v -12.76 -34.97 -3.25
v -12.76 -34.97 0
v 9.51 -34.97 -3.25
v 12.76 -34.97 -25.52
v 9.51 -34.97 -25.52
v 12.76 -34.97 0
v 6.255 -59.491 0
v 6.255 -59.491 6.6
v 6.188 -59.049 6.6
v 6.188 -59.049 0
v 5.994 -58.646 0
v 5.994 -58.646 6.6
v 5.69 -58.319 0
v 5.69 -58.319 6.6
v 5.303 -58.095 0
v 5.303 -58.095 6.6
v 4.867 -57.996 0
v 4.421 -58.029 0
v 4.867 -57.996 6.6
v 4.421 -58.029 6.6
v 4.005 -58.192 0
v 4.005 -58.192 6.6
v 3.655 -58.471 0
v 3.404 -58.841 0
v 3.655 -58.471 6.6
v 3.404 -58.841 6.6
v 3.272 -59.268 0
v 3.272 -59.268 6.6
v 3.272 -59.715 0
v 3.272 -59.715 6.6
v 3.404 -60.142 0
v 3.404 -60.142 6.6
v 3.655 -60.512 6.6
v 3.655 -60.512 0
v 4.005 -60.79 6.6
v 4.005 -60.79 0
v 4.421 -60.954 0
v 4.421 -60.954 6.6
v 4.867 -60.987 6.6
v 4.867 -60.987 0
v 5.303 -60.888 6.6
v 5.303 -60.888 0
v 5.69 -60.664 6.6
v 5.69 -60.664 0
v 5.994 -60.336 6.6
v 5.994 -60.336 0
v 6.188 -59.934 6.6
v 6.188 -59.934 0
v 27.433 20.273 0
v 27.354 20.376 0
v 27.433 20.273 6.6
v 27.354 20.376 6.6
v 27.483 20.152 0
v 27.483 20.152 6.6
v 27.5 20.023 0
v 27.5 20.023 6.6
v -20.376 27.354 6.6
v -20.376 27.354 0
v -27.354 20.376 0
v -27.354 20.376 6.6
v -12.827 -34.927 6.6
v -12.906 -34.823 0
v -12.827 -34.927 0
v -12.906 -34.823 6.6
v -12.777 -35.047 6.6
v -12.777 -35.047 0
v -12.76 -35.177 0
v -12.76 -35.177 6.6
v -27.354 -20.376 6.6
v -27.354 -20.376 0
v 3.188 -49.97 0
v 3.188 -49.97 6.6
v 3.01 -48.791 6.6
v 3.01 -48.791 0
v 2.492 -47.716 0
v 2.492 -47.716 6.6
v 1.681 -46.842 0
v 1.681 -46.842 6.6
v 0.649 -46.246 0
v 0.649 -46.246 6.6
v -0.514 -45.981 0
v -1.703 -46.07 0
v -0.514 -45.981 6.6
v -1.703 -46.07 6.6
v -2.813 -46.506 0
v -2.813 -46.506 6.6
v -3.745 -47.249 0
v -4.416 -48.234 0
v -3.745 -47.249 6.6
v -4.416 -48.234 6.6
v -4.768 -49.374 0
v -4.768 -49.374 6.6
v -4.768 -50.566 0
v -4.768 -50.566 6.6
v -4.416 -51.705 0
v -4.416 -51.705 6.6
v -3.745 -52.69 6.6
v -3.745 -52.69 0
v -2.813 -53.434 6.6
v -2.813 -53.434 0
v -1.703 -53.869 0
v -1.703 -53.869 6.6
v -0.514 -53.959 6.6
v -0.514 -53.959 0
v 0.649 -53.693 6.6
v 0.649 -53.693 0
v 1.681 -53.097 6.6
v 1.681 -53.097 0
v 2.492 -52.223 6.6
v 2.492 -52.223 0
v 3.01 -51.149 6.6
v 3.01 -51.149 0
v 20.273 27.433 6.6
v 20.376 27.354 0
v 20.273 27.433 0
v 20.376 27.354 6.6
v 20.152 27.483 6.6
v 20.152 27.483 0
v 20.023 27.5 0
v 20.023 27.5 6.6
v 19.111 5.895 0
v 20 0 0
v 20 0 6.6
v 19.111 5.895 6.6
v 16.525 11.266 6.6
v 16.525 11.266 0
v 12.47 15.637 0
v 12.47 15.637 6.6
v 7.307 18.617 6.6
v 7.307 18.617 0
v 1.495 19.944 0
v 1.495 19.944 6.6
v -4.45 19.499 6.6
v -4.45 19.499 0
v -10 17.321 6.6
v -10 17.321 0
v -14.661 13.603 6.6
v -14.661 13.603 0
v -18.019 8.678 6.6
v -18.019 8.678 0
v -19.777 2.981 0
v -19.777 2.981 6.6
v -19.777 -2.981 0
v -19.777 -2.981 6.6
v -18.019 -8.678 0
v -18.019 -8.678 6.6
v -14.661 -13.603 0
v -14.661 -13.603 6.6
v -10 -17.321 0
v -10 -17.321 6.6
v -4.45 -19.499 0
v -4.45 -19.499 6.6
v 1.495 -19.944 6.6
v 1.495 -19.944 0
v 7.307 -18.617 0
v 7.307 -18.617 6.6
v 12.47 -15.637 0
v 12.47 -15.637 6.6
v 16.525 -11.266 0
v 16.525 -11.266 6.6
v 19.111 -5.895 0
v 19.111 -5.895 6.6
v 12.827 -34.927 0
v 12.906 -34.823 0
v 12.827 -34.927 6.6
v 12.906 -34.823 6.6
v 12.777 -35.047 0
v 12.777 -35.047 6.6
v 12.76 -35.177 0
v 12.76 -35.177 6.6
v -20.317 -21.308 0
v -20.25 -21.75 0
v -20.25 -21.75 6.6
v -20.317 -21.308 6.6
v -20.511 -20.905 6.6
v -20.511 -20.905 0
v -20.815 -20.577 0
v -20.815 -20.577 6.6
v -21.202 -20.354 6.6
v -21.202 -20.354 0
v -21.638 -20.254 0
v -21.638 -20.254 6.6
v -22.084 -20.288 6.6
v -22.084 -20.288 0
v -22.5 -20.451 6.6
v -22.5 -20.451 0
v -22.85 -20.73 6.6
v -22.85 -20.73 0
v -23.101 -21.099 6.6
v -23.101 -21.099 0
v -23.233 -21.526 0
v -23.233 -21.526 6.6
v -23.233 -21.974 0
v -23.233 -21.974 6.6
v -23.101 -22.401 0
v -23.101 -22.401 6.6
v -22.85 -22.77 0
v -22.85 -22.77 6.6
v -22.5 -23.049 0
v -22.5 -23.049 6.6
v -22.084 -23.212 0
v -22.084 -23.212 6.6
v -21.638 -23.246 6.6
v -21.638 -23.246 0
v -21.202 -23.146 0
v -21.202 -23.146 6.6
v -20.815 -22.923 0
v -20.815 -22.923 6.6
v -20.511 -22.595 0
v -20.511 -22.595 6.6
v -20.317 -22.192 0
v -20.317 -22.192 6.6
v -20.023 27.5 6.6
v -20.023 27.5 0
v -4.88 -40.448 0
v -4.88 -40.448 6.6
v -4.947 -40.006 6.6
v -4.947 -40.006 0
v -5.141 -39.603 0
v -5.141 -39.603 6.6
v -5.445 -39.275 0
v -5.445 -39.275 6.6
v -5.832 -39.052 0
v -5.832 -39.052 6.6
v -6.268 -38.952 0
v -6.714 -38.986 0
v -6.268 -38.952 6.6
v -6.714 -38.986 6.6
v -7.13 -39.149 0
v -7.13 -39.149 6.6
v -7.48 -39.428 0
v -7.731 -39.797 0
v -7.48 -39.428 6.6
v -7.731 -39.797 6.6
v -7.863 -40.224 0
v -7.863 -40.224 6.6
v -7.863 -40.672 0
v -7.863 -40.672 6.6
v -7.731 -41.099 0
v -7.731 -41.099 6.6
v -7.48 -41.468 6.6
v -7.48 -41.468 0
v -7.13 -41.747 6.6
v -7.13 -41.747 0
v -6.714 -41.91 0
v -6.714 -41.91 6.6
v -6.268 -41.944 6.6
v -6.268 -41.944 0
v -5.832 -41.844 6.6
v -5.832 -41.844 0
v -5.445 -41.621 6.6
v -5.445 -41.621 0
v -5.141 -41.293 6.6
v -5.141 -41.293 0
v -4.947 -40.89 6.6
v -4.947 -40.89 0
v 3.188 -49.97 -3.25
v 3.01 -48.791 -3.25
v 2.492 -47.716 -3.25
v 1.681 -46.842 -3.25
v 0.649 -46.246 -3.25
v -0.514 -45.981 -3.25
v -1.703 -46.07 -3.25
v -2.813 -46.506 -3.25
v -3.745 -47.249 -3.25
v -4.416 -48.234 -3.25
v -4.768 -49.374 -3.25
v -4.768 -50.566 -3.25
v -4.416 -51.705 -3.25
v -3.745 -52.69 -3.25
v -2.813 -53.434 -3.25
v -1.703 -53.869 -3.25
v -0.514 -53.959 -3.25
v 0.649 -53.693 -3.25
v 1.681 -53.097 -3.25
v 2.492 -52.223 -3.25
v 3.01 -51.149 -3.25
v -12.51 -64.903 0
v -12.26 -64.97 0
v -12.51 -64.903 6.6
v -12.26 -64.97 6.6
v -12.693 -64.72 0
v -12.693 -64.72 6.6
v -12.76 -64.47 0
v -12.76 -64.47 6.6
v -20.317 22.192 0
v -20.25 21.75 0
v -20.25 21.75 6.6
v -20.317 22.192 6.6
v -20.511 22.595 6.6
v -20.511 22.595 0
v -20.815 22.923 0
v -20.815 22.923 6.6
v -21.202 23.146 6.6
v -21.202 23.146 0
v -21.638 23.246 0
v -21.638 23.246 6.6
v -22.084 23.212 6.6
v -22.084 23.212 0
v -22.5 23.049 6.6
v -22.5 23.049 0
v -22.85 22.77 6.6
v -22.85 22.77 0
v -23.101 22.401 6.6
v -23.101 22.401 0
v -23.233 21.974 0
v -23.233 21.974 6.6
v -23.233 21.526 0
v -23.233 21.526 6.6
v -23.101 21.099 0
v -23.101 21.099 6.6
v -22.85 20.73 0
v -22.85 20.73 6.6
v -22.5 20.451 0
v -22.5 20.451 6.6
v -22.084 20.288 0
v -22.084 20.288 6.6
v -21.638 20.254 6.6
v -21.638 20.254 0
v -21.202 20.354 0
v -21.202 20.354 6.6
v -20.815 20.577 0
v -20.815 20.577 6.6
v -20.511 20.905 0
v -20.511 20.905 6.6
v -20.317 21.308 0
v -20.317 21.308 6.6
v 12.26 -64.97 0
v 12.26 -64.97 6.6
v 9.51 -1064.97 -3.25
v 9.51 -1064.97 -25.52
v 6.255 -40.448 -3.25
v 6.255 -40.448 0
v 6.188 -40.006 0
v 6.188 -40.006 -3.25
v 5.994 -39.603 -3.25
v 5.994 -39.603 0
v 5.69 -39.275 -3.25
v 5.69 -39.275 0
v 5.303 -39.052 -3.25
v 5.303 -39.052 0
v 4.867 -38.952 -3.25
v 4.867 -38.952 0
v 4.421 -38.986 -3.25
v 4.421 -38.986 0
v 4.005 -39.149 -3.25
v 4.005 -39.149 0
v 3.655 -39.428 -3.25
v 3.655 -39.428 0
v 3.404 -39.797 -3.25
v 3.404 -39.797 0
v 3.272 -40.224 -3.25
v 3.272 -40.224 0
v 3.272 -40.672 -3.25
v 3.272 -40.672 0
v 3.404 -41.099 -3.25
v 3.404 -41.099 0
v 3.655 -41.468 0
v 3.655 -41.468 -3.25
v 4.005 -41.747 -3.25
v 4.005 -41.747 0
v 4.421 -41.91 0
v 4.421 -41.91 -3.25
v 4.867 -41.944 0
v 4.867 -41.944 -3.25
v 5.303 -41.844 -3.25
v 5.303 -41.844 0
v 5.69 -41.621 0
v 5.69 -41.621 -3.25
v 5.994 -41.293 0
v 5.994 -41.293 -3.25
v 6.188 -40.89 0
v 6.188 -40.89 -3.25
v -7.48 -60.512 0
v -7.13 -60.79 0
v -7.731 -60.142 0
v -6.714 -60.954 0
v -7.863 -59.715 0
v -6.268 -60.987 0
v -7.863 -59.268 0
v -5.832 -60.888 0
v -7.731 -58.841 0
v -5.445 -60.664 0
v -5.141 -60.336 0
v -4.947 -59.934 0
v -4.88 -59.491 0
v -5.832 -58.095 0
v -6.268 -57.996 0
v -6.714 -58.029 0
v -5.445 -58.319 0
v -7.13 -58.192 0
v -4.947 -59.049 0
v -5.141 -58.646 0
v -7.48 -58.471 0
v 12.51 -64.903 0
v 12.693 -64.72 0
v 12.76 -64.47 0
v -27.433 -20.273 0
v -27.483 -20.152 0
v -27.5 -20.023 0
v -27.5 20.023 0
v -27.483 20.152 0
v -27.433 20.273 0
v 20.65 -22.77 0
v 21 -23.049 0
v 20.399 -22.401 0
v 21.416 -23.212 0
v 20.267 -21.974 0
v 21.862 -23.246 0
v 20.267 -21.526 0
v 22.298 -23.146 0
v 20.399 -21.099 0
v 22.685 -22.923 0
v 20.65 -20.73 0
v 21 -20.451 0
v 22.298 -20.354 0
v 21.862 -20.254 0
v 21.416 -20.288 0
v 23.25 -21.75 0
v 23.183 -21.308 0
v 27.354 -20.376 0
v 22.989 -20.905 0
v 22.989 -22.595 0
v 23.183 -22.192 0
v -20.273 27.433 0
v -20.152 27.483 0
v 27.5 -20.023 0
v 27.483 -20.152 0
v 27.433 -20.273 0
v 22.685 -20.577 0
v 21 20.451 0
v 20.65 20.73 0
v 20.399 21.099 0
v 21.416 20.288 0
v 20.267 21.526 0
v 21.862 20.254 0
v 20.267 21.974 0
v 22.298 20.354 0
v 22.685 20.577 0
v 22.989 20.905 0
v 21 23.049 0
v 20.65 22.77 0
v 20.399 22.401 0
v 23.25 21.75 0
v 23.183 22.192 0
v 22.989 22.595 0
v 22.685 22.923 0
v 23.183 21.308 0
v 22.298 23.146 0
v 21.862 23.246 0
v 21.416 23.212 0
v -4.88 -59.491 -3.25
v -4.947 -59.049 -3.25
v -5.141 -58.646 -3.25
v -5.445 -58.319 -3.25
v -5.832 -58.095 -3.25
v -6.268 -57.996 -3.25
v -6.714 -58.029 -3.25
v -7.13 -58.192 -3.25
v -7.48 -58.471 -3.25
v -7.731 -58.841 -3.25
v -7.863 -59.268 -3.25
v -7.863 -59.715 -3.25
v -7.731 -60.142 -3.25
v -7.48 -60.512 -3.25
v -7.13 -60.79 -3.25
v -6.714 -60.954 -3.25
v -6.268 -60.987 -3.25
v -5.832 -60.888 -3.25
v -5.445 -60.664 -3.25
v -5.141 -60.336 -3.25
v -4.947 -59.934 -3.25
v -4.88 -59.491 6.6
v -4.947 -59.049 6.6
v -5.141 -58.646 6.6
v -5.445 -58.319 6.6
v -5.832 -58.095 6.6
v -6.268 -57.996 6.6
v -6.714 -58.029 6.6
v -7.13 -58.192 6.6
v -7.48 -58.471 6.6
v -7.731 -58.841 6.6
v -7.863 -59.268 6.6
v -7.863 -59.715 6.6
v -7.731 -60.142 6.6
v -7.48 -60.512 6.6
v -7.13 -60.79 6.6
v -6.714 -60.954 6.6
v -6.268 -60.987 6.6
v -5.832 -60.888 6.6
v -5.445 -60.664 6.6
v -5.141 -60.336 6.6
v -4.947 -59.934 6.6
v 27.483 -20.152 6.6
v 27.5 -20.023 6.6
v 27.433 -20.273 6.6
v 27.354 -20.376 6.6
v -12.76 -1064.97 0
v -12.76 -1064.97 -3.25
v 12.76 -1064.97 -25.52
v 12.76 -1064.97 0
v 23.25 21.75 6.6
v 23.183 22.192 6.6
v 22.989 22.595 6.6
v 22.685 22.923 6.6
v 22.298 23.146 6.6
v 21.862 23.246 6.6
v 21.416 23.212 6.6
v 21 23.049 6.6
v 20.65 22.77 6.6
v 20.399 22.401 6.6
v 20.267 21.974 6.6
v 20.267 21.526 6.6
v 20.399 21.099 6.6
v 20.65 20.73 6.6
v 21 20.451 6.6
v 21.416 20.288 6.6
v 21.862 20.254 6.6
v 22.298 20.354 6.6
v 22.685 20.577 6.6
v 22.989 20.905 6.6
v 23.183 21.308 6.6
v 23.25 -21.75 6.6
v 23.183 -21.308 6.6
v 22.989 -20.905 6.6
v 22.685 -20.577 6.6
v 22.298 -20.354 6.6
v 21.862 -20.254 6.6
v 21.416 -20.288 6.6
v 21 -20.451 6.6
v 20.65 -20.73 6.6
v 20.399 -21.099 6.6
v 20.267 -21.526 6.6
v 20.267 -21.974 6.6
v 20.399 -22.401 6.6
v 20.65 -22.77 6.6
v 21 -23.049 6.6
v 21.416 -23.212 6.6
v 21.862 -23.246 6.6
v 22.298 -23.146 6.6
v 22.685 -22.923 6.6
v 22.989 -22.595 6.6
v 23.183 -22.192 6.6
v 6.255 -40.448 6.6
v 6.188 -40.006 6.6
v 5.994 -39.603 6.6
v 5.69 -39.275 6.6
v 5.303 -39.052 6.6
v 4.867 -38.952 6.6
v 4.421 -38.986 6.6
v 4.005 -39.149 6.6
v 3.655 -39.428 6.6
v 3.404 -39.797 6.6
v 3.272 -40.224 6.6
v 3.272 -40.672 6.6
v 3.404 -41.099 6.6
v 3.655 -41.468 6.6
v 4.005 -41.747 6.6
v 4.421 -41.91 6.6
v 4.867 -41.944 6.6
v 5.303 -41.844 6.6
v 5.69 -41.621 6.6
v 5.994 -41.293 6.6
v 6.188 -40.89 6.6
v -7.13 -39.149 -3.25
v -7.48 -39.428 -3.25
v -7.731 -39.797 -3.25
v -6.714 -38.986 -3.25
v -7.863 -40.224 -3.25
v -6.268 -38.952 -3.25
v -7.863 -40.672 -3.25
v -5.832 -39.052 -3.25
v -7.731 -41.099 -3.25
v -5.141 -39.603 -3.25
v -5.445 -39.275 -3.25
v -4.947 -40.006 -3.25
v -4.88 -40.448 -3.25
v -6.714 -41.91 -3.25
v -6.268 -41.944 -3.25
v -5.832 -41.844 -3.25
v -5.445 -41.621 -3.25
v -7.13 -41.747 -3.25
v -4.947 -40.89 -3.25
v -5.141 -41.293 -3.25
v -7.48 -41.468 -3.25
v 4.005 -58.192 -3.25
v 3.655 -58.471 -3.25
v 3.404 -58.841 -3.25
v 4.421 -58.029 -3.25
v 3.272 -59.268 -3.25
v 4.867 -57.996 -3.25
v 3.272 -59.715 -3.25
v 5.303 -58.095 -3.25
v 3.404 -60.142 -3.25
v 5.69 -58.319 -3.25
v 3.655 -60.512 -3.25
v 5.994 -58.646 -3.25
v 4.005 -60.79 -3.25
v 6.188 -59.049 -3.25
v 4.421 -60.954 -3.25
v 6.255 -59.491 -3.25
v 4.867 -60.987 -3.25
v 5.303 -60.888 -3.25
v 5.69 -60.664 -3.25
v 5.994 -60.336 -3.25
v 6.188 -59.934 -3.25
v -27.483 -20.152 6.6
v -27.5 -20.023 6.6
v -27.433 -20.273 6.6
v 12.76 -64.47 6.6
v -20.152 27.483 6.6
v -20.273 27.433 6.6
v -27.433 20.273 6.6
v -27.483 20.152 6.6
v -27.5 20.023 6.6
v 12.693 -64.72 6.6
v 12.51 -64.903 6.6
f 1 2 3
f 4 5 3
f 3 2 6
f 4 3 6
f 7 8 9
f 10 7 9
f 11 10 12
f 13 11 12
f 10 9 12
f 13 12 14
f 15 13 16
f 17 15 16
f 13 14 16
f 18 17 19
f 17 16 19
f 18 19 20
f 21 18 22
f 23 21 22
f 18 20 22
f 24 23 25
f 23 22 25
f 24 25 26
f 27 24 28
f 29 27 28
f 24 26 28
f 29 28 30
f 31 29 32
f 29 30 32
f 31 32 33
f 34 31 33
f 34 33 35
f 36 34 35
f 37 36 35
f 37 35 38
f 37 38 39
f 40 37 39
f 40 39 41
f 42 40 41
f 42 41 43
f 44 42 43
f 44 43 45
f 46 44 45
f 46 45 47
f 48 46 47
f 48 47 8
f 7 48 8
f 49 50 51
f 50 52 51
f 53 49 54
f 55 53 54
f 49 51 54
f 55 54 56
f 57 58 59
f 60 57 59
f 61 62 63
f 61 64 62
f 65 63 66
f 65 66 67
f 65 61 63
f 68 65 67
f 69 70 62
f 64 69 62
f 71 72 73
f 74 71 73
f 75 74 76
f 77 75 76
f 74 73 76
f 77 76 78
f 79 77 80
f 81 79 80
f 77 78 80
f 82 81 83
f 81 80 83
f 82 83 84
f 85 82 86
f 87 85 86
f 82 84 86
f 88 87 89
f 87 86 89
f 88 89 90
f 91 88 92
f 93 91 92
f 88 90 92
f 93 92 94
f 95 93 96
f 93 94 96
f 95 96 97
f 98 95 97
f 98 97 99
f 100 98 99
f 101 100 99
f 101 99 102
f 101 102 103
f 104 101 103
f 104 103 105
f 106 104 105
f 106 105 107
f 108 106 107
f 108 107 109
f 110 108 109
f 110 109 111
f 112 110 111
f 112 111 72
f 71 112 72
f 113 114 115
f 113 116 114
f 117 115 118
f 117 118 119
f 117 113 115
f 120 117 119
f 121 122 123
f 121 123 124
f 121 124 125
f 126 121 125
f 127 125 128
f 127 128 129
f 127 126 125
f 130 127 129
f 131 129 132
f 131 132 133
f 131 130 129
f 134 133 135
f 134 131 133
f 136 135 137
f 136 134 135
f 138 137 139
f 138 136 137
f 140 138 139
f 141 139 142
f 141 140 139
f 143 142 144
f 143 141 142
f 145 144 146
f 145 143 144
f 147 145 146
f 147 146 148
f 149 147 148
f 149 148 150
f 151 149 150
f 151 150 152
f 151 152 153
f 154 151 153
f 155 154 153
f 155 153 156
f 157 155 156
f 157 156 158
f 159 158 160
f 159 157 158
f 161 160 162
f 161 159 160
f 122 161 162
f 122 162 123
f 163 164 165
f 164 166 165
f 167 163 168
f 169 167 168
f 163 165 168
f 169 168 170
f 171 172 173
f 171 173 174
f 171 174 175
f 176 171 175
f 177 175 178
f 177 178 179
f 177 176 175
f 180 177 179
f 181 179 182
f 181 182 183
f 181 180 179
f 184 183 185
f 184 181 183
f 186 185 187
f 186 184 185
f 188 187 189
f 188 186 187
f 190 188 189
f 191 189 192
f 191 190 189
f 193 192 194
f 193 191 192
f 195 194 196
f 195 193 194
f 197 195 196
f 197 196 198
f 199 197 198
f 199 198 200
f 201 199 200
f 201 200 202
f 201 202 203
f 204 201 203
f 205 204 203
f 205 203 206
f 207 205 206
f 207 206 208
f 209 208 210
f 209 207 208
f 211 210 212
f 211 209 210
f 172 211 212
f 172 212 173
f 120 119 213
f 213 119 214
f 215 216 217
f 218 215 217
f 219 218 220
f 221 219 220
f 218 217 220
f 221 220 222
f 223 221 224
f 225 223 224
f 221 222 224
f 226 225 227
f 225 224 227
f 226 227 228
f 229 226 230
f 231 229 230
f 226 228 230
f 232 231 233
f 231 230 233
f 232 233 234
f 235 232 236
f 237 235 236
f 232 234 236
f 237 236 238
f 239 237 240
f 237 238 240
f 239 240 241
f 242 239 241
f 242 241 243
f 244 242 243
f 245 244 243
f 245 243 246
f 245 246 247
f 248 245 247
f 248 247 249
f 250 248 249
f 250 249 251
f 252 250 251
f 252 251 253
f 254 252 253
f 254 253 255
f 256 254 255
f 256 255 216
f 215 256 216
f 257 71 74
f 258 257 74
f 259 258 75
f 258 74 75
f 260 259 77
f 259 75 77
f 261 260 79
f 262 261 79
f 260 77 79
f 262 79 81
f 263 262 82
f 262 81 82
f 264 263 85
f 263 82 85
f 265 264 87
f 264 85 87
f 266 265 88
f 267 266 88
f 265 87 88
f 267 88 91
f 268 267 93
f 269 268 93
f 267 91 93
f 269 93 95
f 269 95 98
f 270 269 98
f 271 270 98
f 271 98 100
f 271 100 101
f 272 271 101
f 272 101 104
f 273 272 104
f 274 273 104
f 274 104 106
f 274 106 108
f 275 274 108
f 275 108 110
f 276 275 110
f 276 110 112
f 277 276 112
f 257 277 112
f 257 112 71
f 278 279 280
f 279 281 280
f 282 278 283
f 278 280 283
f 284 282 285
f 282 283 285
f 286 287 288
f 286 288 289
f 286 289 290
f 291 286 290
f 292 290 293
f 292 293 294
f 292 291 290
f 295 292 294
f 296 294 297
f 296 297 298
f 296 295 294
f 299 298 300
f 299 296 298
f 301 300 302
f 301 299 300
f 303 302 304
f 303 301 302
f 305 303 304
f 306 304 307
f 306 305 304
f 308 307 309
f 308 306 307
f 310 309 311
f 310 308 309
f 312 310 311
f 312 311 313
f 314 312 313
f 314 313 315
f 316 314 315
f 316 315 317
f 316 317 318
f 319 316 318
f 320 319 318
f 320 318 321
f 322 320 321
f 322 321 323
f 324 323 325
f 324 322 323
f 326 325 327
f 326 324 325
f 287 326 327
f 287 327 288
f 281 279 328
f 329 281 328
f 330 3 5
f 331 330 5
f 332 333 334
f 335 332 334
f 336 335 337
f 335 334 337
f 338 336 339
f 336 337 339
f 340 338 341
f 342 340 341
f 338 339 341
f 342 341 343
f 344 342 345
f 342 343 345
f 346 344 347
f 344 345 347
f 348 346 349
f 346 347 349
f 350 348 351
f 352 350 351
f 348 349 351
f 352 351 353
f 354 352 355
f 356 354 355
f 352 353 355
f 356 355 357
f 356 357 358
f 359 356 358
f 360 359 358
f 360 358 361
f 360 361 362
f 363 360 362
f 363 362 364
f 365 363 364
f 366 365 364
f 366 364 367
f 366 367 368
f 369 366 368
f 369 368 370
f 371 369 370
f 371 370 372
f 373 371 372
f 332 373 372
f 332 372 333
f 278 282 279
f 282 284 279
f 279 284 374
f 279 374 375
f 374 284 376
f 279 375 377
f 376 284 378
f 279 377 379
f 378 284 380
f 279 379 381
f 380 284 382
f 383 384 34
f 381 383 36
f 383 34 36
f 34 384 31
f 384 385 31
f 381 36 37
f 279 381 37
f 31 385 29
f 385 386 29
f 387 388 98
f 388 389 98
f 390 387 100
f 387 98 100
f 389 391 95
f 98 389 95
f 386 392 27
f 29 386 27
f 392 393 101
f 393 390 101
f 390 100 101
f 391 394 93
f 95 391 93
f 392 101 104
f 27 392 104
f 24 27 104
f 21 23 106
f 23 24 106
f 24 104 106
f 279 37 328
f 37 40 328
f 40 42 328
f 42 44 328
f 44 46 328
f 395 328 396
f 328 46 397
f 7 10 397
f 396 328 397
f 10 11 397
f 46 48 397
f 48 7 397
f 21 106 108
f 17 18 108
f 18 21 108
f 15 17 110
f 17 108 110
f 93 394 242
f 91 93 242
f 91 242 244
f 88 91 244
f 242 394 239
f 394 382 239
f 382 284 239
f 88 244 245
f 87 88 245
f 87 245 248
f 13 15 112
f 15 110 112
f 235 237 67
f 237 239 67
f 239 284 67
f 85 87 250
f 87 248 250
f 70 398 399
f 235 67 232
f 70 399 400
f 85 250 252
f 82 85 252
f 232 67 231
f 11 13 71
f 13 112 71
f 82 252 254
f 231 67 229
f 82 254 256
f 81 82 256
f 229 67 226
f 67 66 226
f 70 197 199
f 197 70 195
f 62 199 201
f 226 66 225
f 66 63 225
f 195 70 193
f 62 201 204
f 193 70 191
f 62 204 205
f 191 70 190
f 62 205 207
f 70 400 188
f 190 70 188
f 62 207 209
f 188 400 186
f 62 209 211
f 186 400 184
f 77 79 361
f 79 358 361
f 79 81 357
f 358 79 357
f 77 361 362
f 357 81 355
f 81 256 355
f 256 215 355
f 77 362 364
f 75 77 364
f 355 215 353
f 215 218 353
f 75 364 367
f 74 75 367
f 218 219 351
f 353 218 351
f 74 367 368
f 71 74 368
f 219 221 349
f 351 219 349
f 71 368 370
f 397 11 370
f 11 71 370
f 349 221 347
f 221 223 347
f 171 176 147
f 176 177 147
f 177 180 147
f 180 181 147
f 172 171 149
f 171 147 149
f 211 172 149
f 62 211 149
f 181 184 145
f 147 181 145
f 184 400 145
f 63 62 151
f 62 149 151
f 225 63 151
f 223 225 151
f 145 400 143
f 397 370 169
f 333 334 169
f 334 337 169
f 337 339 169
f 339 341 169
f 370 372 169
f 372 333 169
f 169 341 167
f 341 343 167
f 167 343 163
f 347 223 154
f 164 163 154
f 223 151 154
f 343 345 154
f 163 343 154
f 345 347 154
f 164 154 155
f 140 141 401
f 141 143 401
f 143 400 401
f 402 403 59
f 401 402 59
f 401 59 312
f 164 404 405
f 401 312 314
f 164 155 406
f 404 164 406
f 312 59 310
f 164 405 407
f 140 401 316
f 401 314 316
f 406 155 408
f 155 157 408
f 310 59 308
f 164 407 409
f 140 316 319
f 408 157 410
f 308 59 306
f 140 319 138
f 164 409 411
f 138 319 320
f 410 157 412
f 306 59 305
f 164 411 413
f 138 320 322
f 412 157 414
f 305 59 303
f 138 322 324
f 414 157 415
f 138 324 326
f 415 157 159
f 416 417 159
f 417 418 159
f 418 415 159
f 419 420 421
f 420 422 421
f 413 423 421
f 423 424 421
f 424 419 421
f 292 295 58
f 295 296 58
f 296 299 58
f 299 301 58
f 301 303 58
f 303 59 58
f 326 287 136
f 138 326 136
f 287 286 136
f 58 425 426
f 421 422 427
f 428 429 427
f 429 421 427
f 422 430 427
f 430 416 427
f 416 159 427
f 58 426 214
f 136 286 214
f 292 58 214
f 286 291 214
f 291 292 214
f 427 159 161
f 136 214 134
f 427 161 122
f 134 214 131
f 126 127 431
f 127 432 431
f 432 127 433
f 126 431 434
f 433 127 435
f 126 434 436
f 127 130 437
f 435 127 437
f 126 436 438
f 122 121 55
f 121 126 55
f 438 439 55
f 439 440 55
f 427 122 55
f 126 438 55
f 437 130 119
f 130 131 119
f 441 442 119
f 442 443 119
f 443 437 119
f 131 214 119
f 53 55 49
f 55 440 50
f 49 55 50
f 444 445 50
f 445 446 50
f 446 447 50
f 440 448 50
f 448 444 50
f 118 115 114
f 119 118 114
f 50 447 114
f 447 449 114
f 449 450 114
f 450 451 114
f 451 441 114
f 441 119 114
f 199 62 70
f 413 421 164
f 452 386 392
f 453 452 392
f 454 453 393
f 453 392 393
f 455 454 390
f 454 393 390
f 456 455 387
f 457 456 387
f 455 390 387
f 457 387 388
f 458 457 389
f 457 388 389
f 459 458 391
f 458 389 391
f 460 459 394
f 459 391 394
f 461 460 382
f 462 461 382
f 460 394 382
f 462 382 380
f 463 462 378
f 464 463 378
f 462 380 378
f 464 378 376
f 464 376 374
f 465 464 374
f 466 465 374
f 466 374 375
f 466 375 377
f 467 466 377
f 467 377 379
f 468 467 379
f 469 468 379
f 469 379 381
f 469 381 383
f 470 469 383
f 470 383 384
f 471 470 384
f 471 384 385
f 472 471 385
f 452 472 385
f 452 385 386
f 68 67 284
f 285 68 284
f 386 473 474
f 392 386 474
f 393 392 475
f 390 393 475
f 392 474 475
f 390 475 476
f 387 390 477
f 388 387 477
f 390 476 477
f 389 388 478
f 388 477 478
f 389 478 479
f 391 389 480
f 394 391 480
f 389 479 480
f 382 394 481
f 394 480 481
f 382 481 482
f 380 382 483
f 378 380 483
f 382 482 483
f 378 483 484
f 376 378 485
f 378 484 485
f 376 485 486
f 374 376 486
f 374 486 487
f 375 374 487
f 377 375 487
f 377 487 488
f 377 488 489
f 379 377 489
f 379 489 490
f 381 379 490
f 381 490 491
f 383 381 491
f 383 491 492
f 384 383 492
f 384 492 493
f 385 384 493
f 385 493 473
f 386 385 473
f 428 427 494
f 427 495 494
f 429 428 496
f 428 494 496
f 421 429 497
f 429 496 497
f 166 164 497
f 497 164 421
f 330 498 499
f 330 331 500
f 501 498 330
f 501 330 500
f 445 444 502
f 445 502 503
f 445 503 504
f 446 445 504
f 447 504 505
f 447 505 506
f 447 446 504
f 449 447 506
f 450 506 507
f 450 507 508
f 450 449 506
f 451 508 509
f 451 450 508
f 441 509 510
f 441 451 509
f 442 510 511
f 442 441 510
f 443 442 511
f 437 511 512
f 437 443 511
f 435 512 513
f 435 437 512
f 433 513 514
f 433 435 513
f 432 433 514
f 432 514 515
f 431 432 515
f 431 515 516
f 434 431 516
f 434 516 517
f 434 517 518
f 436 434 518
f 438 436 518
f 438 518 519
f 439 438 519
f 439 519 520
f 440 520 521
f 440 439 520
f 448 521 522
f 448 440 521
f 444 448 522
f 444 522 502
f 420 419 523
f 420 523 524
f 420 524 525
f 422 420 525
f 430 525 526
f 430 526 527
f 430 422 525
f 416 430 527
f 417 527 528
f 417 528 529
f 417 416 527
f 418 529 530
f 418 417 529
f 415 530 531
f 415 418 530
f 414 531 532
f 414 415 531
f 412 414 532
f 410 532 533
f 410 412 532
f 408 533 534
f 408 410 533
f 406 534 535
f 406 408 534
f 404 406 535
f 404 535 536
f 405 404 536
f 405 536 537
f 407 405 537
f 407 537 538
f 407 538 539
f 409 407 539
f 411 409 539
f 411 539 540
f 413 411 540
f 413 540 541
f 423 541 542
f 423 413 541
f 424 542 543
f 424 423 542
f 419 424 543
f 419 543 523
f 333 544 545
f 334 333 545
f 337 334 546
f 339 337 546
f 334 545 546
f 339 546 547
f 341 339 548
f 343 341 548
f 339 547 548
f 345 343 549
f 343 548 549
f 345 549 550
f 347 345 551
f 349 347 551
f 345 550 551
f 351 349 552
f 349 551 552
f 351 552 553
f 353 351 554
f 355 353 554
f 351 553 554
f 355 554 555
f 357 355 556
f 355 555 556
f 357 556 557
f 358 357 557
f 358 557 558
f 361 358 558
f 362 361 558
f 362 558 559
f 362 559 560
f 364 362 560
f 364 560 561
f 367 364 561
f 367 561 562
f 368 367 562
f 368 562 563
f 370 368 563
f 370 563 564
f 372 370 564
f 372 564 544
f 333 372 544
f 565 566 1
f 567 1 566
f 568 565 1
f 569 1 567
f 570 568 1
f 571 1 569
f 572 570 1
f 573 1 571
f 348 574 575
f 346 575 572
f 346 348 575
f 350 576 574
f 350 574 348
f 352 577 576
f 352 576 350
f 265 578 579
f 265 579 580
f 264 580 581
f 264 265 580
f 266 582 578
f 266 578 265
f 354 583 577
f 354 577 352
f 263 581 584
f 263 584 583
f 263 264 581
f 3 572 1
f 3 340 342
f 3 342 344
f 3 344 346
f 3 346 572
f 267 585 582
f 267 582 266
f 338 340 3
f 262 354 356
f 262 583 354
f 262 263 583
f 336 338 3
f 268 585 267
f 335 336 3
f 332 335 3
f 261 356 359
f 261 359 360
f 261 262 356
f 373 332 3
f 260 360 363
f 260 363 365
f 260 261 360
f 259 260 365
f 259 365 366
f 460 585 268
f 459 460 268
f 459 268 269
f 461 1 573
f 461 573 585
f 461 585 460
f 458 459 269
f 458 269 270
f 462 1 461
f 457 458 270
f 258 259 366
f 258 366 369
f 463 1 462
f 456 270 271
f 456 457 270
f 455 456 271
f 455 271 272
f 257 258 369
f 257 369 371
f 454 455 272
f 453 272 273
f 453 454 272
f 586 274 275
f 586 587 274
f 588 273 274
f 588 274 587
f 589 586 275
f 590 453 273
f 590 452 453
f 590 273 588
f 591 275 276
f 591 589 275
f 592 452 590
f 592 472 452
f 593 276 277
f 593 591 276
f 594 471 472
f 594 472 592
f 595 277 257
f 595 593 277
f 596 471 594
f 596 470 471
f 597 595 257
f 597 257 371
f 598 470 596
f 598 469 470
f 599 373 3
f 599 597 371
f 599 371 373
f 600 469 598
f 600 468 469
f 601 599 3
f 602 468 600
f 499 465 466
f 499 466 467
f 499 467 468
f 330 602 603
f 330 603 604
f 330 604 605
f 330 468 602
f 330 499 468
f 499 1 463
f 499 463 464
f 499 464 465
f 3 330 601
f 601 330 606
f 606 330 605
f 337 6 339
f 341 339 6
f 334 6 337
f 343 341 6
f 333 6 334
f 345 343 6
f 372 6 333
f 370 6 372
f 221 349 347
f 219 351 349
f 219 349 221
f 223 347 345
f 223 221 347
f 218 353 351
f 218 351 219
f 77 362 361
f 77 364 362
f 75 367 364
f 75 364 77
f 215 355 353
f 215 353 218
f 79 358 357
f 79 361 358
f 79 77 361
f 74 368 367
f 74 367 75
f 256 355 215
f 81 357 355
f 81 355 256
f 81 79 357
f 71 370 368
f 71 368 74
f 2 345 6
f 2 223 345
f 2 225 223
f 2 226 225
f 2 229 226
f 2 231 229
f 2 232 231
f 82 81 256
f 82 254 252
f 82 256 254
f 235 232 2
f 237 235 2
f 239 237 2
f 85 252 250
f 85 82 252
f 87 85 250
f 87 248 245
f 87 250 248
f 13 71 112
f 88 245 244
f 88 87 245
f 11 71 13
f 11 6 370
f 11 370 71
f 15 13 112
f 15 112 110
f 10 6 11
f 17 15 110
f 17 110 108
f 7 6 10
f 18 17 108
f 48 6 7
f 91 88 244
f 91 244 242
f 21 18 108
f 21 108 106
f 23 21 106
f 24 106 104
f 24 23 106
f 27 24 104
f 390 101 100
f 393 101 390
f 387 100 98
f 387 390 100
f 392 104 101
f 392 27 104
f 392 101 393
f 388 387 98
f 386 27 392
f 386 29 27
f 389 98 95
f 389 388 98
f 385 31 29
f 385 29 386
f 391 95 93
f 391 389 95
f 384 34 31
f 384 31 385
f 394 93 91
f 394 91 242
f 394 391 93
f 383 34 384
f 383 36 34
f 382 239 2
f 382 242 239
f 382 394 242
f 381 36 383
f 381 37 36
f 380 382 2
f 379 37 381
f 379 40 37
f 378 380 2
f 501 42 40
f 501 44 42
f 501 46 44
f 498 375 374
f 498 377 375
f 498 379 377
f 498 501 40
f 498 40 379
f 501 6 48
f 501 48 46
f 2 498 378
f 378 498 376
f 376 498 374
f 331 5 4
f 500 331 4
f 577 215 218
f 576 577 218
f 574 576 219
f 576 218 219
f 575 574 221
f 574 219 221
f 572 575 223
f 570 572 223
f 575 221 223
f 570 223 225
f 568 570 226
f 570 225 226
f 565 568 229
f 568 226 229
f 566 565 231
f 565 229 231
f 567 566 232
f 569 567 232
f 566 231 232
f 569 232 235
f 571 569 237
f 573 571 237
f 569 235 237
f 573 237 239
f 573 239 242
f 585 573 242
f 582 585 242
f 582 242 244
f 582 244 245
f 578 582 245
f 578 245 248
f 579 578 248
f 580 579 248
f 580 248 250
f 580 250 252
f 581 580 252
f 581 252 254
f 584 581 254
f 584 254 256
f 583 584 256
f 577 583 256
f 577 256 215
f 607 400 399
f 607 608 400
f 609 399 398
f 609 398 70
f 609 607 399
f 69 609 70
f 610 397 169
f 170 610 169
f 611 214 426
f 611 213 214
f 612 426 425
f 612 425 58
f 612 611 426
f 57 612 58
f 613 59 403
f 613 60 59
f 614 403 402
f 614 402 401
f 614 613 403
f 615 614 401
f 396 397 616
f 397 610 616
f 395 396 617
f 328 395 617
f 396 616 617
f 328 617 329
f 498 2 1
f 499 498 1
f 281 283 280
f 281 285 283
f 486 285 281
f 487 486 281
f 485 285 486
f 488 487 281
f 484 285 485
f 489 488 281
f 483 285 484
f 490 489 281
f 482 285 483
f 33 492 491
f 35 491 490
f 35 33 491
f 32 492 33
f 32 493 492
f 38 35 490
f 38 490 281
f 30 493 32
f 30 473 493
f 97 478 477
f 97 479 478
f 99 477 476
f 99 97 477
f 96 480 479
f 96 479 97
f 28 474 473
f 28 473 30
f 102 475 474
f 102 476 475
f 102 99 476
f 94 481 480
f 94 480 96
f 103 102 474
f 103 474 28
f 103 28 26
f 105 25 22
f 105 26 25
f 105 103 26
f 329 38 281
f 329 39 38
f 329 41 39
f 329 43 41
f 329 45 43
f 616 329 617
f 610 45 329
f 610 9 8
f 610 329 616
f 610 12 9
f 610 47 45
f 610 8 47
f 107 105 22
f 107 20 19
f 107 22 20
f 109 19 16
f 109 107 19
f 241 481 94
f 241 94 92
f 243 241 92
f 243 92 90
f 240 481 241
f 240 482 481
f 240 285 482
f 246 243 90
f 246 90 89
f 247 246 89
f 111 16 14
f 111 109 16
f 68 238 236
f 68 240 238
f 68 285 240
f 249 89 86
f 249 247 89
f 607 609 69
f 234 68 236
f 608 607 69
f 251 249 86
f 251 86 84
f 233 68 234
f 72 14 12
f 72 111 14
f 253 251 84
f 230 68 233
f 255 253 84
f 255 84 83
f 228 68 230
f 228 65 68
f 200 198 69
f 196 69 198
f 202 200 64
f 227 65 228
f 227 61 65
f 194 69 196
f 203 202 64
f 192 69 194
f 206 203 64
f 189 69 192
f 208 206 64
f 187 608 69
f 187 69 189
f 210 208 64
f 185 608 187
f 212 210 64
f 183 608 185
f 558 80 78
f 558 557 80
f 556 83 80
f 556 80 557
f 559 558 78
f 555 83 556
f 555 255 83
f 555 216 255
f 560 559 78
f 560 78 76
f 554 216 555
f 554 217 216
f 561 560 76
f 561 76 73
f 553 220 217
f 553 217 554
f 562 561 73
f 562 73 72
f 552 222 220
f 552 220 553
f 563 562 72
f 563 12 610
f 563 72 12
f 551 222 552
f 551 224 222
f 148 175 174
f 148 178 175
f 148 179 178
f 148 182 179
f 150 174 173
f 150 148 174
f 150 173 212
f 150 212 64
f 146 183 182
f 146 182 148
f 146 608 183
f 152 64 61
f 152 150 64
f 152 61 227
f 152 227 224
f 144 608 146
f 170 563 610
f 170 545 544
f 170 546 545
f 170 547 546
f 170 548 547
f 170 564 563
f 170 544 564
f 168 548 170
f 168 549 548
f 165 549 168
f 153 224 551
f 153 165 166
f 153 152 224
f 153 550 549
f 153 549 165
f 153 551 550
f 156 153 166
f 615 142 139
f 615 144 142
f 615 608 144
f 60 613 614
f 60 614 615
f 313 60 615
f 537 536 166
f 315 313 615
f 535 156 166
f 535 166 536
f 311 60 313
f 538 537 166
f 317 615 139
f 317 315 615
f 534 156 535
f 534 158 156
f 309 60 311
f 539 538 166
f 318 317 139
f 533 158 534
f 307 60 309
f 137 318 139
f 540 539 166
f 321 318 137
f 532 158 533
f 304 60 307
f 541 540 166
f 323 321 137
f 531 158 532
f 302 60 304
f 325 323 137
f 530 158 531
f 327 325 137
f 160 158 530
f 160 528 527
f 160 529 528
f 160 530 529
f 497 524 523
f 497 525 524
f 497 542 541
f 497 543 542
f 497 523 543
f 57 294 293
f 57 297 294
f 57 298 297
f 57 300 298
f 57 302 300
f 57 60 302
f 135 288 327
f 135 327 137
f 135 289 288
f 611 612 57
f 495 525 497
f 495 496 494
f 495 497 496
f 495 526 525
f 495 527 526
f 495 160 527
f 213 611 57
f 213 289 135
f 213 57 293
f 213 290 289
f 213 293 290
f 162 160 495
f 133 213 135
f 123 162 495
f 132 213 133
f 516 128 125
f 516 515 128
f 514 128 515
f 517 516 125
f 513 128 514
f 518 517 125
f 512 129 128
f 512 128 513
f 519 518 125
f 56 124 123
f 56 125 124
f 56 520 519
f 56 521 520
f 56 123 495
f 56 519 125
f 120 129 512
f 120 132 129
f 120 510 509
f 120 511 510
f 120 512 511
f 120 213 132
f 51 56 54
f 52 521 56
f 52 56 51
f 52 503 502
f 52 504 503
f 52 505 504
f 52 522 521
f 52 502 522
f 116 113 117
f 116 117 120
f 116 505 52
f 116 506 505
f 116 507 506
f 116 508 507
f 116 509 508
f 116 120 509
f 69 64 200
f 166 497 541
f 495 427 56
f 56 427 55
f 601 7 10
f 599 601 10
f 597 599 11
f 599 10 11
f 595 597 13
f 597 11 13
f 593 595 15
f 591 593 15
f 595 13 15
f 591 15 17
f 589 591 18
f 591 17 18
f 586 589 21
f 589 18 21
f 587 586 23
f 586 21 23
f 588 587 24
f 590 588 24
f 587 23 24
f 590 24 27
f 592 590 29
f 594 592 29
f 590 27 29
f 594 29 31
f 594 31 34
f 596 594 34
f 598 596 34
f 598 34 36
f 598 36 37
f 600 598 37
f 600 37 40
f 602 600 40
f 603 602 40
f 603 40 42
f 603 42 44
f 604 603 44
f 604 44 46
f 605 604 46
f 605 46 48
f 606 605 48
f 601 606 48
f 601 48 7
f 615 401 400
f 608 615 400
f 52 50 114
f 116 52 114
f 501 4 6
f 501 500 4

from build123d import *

# Parameters (mm, degrees)
F0_R          = 1.5
F0_R_2        = 20
F1_DEPTH      = 6.6
F3_DEPTH      = 1000
F3_DEPTH_BACK = 30
F4_R          = 1.5
F4_R_2        = 4
F5_DEPTH      = 32.121
F6_R          = 0.5


with BuildPart() as f1:
    # F0 (on Top) → F1 (new body)
    with BuildSketch(Plane.XY):
        Polygon((27.5, 20.229708), (20.229708, 27.5), (-20.229708, 27.5), (-27.5, 20.229708), (-27.5, -20.229708), (-20.229708, -27.5), (-12.76, -34.969708), (-12.76, -64.969708), (12.76, -64.969708), (12.76, -34.969708), (20.229708, -27.5), (27.5, -20.229708), align=None)
        with Locations((-21.75, -21.75)):
            Circle(F0_R, mode=Mode.SUBTRACT)
        with Locations((21.75, -21.75)):
            Circle(F0_R, mode=Mode.SUBTRACT)
        with Locations((-21.75, 21.75)):
            Circle(F0_R, mode=Mode.SUBTRACT)
        Circle(F0_R_2, mode=Mode.SUBTRACT)
        with Locations((21.75, 21.75)):
            Circle(F0_R, mode=Mode.SUBTRACT)
    extrude(amount=F1_DEPTH)


with BuildPart() as f3:
    # F2 (on face) → F3 (new body, two sides)
    with BuildSketch(Plane.XZ.offset(64.969708)) as f3_sk:
        Polygon((12.76, -25.52), (12.76, 0), (-12.76, 0), (-12.76, -3.25), (9.51, -3.25), (9.51, -25.52), align=None)
    extrude(amount=F3_DEPTH)
    extrude(f3_sk.sketch, amount=-F3_DEPTH_BACK)


with BuildPart() as f5_tool:
    # F4 (on face) → F5 (new body, through all)
    with BuildSketch(Plane.XY.offset(6.6)):
        with Locations((-6.38, -40.44804)):
            Circle(F4_R)
        with Locations((4.755, -40.44804)):
            Circle(F4_R)
        with Locations((-6.38, -59.491376)):
            Circle(F4_R)
        with Locations((4.755, -59.491376)):
            Circle(F4_R)
        with Locations((-0.8125, -49.969708)):
            Circle(F4_R_2)
    extrude(amount=-F5_DEPTH)


with BuildPart() as f1_1:
    add(f1.part)

    # F5: cut by f5_tool
    add(f5_tool.part, mode=Mode.SUBTRACT)

    # F6
    f6_edges = [f1_1.edges().sort_by_distance(p)[0] for p in [
        (12.76, -64.969708, 3.3),
        (-12.76, -64.969708, 3.3),
        (27.5, -20.229708, 3.3),
        (12.76, -34.969708, 3.3),
        (-12.76, -34.969708, 3.3),
        (-27.5, -20.229708, 3.3),
        (27.5, 20.229708, 3.3),
        (20.229708, 27.5, 3.3),
        (-20.229708, 27.5, 3.3),
        (-27.5, 20.229708, 3.3),
    ]]
    fillet(f6_edges, radius=F6_R)


with BuildPart() as f3_1:
    add(f3.part)

    # F5: cut by f5_tool
    add(f5_tool.part, mode=Mode.SUBTRACT)


solid = Compound([f1_1.part, f3_1.part])
